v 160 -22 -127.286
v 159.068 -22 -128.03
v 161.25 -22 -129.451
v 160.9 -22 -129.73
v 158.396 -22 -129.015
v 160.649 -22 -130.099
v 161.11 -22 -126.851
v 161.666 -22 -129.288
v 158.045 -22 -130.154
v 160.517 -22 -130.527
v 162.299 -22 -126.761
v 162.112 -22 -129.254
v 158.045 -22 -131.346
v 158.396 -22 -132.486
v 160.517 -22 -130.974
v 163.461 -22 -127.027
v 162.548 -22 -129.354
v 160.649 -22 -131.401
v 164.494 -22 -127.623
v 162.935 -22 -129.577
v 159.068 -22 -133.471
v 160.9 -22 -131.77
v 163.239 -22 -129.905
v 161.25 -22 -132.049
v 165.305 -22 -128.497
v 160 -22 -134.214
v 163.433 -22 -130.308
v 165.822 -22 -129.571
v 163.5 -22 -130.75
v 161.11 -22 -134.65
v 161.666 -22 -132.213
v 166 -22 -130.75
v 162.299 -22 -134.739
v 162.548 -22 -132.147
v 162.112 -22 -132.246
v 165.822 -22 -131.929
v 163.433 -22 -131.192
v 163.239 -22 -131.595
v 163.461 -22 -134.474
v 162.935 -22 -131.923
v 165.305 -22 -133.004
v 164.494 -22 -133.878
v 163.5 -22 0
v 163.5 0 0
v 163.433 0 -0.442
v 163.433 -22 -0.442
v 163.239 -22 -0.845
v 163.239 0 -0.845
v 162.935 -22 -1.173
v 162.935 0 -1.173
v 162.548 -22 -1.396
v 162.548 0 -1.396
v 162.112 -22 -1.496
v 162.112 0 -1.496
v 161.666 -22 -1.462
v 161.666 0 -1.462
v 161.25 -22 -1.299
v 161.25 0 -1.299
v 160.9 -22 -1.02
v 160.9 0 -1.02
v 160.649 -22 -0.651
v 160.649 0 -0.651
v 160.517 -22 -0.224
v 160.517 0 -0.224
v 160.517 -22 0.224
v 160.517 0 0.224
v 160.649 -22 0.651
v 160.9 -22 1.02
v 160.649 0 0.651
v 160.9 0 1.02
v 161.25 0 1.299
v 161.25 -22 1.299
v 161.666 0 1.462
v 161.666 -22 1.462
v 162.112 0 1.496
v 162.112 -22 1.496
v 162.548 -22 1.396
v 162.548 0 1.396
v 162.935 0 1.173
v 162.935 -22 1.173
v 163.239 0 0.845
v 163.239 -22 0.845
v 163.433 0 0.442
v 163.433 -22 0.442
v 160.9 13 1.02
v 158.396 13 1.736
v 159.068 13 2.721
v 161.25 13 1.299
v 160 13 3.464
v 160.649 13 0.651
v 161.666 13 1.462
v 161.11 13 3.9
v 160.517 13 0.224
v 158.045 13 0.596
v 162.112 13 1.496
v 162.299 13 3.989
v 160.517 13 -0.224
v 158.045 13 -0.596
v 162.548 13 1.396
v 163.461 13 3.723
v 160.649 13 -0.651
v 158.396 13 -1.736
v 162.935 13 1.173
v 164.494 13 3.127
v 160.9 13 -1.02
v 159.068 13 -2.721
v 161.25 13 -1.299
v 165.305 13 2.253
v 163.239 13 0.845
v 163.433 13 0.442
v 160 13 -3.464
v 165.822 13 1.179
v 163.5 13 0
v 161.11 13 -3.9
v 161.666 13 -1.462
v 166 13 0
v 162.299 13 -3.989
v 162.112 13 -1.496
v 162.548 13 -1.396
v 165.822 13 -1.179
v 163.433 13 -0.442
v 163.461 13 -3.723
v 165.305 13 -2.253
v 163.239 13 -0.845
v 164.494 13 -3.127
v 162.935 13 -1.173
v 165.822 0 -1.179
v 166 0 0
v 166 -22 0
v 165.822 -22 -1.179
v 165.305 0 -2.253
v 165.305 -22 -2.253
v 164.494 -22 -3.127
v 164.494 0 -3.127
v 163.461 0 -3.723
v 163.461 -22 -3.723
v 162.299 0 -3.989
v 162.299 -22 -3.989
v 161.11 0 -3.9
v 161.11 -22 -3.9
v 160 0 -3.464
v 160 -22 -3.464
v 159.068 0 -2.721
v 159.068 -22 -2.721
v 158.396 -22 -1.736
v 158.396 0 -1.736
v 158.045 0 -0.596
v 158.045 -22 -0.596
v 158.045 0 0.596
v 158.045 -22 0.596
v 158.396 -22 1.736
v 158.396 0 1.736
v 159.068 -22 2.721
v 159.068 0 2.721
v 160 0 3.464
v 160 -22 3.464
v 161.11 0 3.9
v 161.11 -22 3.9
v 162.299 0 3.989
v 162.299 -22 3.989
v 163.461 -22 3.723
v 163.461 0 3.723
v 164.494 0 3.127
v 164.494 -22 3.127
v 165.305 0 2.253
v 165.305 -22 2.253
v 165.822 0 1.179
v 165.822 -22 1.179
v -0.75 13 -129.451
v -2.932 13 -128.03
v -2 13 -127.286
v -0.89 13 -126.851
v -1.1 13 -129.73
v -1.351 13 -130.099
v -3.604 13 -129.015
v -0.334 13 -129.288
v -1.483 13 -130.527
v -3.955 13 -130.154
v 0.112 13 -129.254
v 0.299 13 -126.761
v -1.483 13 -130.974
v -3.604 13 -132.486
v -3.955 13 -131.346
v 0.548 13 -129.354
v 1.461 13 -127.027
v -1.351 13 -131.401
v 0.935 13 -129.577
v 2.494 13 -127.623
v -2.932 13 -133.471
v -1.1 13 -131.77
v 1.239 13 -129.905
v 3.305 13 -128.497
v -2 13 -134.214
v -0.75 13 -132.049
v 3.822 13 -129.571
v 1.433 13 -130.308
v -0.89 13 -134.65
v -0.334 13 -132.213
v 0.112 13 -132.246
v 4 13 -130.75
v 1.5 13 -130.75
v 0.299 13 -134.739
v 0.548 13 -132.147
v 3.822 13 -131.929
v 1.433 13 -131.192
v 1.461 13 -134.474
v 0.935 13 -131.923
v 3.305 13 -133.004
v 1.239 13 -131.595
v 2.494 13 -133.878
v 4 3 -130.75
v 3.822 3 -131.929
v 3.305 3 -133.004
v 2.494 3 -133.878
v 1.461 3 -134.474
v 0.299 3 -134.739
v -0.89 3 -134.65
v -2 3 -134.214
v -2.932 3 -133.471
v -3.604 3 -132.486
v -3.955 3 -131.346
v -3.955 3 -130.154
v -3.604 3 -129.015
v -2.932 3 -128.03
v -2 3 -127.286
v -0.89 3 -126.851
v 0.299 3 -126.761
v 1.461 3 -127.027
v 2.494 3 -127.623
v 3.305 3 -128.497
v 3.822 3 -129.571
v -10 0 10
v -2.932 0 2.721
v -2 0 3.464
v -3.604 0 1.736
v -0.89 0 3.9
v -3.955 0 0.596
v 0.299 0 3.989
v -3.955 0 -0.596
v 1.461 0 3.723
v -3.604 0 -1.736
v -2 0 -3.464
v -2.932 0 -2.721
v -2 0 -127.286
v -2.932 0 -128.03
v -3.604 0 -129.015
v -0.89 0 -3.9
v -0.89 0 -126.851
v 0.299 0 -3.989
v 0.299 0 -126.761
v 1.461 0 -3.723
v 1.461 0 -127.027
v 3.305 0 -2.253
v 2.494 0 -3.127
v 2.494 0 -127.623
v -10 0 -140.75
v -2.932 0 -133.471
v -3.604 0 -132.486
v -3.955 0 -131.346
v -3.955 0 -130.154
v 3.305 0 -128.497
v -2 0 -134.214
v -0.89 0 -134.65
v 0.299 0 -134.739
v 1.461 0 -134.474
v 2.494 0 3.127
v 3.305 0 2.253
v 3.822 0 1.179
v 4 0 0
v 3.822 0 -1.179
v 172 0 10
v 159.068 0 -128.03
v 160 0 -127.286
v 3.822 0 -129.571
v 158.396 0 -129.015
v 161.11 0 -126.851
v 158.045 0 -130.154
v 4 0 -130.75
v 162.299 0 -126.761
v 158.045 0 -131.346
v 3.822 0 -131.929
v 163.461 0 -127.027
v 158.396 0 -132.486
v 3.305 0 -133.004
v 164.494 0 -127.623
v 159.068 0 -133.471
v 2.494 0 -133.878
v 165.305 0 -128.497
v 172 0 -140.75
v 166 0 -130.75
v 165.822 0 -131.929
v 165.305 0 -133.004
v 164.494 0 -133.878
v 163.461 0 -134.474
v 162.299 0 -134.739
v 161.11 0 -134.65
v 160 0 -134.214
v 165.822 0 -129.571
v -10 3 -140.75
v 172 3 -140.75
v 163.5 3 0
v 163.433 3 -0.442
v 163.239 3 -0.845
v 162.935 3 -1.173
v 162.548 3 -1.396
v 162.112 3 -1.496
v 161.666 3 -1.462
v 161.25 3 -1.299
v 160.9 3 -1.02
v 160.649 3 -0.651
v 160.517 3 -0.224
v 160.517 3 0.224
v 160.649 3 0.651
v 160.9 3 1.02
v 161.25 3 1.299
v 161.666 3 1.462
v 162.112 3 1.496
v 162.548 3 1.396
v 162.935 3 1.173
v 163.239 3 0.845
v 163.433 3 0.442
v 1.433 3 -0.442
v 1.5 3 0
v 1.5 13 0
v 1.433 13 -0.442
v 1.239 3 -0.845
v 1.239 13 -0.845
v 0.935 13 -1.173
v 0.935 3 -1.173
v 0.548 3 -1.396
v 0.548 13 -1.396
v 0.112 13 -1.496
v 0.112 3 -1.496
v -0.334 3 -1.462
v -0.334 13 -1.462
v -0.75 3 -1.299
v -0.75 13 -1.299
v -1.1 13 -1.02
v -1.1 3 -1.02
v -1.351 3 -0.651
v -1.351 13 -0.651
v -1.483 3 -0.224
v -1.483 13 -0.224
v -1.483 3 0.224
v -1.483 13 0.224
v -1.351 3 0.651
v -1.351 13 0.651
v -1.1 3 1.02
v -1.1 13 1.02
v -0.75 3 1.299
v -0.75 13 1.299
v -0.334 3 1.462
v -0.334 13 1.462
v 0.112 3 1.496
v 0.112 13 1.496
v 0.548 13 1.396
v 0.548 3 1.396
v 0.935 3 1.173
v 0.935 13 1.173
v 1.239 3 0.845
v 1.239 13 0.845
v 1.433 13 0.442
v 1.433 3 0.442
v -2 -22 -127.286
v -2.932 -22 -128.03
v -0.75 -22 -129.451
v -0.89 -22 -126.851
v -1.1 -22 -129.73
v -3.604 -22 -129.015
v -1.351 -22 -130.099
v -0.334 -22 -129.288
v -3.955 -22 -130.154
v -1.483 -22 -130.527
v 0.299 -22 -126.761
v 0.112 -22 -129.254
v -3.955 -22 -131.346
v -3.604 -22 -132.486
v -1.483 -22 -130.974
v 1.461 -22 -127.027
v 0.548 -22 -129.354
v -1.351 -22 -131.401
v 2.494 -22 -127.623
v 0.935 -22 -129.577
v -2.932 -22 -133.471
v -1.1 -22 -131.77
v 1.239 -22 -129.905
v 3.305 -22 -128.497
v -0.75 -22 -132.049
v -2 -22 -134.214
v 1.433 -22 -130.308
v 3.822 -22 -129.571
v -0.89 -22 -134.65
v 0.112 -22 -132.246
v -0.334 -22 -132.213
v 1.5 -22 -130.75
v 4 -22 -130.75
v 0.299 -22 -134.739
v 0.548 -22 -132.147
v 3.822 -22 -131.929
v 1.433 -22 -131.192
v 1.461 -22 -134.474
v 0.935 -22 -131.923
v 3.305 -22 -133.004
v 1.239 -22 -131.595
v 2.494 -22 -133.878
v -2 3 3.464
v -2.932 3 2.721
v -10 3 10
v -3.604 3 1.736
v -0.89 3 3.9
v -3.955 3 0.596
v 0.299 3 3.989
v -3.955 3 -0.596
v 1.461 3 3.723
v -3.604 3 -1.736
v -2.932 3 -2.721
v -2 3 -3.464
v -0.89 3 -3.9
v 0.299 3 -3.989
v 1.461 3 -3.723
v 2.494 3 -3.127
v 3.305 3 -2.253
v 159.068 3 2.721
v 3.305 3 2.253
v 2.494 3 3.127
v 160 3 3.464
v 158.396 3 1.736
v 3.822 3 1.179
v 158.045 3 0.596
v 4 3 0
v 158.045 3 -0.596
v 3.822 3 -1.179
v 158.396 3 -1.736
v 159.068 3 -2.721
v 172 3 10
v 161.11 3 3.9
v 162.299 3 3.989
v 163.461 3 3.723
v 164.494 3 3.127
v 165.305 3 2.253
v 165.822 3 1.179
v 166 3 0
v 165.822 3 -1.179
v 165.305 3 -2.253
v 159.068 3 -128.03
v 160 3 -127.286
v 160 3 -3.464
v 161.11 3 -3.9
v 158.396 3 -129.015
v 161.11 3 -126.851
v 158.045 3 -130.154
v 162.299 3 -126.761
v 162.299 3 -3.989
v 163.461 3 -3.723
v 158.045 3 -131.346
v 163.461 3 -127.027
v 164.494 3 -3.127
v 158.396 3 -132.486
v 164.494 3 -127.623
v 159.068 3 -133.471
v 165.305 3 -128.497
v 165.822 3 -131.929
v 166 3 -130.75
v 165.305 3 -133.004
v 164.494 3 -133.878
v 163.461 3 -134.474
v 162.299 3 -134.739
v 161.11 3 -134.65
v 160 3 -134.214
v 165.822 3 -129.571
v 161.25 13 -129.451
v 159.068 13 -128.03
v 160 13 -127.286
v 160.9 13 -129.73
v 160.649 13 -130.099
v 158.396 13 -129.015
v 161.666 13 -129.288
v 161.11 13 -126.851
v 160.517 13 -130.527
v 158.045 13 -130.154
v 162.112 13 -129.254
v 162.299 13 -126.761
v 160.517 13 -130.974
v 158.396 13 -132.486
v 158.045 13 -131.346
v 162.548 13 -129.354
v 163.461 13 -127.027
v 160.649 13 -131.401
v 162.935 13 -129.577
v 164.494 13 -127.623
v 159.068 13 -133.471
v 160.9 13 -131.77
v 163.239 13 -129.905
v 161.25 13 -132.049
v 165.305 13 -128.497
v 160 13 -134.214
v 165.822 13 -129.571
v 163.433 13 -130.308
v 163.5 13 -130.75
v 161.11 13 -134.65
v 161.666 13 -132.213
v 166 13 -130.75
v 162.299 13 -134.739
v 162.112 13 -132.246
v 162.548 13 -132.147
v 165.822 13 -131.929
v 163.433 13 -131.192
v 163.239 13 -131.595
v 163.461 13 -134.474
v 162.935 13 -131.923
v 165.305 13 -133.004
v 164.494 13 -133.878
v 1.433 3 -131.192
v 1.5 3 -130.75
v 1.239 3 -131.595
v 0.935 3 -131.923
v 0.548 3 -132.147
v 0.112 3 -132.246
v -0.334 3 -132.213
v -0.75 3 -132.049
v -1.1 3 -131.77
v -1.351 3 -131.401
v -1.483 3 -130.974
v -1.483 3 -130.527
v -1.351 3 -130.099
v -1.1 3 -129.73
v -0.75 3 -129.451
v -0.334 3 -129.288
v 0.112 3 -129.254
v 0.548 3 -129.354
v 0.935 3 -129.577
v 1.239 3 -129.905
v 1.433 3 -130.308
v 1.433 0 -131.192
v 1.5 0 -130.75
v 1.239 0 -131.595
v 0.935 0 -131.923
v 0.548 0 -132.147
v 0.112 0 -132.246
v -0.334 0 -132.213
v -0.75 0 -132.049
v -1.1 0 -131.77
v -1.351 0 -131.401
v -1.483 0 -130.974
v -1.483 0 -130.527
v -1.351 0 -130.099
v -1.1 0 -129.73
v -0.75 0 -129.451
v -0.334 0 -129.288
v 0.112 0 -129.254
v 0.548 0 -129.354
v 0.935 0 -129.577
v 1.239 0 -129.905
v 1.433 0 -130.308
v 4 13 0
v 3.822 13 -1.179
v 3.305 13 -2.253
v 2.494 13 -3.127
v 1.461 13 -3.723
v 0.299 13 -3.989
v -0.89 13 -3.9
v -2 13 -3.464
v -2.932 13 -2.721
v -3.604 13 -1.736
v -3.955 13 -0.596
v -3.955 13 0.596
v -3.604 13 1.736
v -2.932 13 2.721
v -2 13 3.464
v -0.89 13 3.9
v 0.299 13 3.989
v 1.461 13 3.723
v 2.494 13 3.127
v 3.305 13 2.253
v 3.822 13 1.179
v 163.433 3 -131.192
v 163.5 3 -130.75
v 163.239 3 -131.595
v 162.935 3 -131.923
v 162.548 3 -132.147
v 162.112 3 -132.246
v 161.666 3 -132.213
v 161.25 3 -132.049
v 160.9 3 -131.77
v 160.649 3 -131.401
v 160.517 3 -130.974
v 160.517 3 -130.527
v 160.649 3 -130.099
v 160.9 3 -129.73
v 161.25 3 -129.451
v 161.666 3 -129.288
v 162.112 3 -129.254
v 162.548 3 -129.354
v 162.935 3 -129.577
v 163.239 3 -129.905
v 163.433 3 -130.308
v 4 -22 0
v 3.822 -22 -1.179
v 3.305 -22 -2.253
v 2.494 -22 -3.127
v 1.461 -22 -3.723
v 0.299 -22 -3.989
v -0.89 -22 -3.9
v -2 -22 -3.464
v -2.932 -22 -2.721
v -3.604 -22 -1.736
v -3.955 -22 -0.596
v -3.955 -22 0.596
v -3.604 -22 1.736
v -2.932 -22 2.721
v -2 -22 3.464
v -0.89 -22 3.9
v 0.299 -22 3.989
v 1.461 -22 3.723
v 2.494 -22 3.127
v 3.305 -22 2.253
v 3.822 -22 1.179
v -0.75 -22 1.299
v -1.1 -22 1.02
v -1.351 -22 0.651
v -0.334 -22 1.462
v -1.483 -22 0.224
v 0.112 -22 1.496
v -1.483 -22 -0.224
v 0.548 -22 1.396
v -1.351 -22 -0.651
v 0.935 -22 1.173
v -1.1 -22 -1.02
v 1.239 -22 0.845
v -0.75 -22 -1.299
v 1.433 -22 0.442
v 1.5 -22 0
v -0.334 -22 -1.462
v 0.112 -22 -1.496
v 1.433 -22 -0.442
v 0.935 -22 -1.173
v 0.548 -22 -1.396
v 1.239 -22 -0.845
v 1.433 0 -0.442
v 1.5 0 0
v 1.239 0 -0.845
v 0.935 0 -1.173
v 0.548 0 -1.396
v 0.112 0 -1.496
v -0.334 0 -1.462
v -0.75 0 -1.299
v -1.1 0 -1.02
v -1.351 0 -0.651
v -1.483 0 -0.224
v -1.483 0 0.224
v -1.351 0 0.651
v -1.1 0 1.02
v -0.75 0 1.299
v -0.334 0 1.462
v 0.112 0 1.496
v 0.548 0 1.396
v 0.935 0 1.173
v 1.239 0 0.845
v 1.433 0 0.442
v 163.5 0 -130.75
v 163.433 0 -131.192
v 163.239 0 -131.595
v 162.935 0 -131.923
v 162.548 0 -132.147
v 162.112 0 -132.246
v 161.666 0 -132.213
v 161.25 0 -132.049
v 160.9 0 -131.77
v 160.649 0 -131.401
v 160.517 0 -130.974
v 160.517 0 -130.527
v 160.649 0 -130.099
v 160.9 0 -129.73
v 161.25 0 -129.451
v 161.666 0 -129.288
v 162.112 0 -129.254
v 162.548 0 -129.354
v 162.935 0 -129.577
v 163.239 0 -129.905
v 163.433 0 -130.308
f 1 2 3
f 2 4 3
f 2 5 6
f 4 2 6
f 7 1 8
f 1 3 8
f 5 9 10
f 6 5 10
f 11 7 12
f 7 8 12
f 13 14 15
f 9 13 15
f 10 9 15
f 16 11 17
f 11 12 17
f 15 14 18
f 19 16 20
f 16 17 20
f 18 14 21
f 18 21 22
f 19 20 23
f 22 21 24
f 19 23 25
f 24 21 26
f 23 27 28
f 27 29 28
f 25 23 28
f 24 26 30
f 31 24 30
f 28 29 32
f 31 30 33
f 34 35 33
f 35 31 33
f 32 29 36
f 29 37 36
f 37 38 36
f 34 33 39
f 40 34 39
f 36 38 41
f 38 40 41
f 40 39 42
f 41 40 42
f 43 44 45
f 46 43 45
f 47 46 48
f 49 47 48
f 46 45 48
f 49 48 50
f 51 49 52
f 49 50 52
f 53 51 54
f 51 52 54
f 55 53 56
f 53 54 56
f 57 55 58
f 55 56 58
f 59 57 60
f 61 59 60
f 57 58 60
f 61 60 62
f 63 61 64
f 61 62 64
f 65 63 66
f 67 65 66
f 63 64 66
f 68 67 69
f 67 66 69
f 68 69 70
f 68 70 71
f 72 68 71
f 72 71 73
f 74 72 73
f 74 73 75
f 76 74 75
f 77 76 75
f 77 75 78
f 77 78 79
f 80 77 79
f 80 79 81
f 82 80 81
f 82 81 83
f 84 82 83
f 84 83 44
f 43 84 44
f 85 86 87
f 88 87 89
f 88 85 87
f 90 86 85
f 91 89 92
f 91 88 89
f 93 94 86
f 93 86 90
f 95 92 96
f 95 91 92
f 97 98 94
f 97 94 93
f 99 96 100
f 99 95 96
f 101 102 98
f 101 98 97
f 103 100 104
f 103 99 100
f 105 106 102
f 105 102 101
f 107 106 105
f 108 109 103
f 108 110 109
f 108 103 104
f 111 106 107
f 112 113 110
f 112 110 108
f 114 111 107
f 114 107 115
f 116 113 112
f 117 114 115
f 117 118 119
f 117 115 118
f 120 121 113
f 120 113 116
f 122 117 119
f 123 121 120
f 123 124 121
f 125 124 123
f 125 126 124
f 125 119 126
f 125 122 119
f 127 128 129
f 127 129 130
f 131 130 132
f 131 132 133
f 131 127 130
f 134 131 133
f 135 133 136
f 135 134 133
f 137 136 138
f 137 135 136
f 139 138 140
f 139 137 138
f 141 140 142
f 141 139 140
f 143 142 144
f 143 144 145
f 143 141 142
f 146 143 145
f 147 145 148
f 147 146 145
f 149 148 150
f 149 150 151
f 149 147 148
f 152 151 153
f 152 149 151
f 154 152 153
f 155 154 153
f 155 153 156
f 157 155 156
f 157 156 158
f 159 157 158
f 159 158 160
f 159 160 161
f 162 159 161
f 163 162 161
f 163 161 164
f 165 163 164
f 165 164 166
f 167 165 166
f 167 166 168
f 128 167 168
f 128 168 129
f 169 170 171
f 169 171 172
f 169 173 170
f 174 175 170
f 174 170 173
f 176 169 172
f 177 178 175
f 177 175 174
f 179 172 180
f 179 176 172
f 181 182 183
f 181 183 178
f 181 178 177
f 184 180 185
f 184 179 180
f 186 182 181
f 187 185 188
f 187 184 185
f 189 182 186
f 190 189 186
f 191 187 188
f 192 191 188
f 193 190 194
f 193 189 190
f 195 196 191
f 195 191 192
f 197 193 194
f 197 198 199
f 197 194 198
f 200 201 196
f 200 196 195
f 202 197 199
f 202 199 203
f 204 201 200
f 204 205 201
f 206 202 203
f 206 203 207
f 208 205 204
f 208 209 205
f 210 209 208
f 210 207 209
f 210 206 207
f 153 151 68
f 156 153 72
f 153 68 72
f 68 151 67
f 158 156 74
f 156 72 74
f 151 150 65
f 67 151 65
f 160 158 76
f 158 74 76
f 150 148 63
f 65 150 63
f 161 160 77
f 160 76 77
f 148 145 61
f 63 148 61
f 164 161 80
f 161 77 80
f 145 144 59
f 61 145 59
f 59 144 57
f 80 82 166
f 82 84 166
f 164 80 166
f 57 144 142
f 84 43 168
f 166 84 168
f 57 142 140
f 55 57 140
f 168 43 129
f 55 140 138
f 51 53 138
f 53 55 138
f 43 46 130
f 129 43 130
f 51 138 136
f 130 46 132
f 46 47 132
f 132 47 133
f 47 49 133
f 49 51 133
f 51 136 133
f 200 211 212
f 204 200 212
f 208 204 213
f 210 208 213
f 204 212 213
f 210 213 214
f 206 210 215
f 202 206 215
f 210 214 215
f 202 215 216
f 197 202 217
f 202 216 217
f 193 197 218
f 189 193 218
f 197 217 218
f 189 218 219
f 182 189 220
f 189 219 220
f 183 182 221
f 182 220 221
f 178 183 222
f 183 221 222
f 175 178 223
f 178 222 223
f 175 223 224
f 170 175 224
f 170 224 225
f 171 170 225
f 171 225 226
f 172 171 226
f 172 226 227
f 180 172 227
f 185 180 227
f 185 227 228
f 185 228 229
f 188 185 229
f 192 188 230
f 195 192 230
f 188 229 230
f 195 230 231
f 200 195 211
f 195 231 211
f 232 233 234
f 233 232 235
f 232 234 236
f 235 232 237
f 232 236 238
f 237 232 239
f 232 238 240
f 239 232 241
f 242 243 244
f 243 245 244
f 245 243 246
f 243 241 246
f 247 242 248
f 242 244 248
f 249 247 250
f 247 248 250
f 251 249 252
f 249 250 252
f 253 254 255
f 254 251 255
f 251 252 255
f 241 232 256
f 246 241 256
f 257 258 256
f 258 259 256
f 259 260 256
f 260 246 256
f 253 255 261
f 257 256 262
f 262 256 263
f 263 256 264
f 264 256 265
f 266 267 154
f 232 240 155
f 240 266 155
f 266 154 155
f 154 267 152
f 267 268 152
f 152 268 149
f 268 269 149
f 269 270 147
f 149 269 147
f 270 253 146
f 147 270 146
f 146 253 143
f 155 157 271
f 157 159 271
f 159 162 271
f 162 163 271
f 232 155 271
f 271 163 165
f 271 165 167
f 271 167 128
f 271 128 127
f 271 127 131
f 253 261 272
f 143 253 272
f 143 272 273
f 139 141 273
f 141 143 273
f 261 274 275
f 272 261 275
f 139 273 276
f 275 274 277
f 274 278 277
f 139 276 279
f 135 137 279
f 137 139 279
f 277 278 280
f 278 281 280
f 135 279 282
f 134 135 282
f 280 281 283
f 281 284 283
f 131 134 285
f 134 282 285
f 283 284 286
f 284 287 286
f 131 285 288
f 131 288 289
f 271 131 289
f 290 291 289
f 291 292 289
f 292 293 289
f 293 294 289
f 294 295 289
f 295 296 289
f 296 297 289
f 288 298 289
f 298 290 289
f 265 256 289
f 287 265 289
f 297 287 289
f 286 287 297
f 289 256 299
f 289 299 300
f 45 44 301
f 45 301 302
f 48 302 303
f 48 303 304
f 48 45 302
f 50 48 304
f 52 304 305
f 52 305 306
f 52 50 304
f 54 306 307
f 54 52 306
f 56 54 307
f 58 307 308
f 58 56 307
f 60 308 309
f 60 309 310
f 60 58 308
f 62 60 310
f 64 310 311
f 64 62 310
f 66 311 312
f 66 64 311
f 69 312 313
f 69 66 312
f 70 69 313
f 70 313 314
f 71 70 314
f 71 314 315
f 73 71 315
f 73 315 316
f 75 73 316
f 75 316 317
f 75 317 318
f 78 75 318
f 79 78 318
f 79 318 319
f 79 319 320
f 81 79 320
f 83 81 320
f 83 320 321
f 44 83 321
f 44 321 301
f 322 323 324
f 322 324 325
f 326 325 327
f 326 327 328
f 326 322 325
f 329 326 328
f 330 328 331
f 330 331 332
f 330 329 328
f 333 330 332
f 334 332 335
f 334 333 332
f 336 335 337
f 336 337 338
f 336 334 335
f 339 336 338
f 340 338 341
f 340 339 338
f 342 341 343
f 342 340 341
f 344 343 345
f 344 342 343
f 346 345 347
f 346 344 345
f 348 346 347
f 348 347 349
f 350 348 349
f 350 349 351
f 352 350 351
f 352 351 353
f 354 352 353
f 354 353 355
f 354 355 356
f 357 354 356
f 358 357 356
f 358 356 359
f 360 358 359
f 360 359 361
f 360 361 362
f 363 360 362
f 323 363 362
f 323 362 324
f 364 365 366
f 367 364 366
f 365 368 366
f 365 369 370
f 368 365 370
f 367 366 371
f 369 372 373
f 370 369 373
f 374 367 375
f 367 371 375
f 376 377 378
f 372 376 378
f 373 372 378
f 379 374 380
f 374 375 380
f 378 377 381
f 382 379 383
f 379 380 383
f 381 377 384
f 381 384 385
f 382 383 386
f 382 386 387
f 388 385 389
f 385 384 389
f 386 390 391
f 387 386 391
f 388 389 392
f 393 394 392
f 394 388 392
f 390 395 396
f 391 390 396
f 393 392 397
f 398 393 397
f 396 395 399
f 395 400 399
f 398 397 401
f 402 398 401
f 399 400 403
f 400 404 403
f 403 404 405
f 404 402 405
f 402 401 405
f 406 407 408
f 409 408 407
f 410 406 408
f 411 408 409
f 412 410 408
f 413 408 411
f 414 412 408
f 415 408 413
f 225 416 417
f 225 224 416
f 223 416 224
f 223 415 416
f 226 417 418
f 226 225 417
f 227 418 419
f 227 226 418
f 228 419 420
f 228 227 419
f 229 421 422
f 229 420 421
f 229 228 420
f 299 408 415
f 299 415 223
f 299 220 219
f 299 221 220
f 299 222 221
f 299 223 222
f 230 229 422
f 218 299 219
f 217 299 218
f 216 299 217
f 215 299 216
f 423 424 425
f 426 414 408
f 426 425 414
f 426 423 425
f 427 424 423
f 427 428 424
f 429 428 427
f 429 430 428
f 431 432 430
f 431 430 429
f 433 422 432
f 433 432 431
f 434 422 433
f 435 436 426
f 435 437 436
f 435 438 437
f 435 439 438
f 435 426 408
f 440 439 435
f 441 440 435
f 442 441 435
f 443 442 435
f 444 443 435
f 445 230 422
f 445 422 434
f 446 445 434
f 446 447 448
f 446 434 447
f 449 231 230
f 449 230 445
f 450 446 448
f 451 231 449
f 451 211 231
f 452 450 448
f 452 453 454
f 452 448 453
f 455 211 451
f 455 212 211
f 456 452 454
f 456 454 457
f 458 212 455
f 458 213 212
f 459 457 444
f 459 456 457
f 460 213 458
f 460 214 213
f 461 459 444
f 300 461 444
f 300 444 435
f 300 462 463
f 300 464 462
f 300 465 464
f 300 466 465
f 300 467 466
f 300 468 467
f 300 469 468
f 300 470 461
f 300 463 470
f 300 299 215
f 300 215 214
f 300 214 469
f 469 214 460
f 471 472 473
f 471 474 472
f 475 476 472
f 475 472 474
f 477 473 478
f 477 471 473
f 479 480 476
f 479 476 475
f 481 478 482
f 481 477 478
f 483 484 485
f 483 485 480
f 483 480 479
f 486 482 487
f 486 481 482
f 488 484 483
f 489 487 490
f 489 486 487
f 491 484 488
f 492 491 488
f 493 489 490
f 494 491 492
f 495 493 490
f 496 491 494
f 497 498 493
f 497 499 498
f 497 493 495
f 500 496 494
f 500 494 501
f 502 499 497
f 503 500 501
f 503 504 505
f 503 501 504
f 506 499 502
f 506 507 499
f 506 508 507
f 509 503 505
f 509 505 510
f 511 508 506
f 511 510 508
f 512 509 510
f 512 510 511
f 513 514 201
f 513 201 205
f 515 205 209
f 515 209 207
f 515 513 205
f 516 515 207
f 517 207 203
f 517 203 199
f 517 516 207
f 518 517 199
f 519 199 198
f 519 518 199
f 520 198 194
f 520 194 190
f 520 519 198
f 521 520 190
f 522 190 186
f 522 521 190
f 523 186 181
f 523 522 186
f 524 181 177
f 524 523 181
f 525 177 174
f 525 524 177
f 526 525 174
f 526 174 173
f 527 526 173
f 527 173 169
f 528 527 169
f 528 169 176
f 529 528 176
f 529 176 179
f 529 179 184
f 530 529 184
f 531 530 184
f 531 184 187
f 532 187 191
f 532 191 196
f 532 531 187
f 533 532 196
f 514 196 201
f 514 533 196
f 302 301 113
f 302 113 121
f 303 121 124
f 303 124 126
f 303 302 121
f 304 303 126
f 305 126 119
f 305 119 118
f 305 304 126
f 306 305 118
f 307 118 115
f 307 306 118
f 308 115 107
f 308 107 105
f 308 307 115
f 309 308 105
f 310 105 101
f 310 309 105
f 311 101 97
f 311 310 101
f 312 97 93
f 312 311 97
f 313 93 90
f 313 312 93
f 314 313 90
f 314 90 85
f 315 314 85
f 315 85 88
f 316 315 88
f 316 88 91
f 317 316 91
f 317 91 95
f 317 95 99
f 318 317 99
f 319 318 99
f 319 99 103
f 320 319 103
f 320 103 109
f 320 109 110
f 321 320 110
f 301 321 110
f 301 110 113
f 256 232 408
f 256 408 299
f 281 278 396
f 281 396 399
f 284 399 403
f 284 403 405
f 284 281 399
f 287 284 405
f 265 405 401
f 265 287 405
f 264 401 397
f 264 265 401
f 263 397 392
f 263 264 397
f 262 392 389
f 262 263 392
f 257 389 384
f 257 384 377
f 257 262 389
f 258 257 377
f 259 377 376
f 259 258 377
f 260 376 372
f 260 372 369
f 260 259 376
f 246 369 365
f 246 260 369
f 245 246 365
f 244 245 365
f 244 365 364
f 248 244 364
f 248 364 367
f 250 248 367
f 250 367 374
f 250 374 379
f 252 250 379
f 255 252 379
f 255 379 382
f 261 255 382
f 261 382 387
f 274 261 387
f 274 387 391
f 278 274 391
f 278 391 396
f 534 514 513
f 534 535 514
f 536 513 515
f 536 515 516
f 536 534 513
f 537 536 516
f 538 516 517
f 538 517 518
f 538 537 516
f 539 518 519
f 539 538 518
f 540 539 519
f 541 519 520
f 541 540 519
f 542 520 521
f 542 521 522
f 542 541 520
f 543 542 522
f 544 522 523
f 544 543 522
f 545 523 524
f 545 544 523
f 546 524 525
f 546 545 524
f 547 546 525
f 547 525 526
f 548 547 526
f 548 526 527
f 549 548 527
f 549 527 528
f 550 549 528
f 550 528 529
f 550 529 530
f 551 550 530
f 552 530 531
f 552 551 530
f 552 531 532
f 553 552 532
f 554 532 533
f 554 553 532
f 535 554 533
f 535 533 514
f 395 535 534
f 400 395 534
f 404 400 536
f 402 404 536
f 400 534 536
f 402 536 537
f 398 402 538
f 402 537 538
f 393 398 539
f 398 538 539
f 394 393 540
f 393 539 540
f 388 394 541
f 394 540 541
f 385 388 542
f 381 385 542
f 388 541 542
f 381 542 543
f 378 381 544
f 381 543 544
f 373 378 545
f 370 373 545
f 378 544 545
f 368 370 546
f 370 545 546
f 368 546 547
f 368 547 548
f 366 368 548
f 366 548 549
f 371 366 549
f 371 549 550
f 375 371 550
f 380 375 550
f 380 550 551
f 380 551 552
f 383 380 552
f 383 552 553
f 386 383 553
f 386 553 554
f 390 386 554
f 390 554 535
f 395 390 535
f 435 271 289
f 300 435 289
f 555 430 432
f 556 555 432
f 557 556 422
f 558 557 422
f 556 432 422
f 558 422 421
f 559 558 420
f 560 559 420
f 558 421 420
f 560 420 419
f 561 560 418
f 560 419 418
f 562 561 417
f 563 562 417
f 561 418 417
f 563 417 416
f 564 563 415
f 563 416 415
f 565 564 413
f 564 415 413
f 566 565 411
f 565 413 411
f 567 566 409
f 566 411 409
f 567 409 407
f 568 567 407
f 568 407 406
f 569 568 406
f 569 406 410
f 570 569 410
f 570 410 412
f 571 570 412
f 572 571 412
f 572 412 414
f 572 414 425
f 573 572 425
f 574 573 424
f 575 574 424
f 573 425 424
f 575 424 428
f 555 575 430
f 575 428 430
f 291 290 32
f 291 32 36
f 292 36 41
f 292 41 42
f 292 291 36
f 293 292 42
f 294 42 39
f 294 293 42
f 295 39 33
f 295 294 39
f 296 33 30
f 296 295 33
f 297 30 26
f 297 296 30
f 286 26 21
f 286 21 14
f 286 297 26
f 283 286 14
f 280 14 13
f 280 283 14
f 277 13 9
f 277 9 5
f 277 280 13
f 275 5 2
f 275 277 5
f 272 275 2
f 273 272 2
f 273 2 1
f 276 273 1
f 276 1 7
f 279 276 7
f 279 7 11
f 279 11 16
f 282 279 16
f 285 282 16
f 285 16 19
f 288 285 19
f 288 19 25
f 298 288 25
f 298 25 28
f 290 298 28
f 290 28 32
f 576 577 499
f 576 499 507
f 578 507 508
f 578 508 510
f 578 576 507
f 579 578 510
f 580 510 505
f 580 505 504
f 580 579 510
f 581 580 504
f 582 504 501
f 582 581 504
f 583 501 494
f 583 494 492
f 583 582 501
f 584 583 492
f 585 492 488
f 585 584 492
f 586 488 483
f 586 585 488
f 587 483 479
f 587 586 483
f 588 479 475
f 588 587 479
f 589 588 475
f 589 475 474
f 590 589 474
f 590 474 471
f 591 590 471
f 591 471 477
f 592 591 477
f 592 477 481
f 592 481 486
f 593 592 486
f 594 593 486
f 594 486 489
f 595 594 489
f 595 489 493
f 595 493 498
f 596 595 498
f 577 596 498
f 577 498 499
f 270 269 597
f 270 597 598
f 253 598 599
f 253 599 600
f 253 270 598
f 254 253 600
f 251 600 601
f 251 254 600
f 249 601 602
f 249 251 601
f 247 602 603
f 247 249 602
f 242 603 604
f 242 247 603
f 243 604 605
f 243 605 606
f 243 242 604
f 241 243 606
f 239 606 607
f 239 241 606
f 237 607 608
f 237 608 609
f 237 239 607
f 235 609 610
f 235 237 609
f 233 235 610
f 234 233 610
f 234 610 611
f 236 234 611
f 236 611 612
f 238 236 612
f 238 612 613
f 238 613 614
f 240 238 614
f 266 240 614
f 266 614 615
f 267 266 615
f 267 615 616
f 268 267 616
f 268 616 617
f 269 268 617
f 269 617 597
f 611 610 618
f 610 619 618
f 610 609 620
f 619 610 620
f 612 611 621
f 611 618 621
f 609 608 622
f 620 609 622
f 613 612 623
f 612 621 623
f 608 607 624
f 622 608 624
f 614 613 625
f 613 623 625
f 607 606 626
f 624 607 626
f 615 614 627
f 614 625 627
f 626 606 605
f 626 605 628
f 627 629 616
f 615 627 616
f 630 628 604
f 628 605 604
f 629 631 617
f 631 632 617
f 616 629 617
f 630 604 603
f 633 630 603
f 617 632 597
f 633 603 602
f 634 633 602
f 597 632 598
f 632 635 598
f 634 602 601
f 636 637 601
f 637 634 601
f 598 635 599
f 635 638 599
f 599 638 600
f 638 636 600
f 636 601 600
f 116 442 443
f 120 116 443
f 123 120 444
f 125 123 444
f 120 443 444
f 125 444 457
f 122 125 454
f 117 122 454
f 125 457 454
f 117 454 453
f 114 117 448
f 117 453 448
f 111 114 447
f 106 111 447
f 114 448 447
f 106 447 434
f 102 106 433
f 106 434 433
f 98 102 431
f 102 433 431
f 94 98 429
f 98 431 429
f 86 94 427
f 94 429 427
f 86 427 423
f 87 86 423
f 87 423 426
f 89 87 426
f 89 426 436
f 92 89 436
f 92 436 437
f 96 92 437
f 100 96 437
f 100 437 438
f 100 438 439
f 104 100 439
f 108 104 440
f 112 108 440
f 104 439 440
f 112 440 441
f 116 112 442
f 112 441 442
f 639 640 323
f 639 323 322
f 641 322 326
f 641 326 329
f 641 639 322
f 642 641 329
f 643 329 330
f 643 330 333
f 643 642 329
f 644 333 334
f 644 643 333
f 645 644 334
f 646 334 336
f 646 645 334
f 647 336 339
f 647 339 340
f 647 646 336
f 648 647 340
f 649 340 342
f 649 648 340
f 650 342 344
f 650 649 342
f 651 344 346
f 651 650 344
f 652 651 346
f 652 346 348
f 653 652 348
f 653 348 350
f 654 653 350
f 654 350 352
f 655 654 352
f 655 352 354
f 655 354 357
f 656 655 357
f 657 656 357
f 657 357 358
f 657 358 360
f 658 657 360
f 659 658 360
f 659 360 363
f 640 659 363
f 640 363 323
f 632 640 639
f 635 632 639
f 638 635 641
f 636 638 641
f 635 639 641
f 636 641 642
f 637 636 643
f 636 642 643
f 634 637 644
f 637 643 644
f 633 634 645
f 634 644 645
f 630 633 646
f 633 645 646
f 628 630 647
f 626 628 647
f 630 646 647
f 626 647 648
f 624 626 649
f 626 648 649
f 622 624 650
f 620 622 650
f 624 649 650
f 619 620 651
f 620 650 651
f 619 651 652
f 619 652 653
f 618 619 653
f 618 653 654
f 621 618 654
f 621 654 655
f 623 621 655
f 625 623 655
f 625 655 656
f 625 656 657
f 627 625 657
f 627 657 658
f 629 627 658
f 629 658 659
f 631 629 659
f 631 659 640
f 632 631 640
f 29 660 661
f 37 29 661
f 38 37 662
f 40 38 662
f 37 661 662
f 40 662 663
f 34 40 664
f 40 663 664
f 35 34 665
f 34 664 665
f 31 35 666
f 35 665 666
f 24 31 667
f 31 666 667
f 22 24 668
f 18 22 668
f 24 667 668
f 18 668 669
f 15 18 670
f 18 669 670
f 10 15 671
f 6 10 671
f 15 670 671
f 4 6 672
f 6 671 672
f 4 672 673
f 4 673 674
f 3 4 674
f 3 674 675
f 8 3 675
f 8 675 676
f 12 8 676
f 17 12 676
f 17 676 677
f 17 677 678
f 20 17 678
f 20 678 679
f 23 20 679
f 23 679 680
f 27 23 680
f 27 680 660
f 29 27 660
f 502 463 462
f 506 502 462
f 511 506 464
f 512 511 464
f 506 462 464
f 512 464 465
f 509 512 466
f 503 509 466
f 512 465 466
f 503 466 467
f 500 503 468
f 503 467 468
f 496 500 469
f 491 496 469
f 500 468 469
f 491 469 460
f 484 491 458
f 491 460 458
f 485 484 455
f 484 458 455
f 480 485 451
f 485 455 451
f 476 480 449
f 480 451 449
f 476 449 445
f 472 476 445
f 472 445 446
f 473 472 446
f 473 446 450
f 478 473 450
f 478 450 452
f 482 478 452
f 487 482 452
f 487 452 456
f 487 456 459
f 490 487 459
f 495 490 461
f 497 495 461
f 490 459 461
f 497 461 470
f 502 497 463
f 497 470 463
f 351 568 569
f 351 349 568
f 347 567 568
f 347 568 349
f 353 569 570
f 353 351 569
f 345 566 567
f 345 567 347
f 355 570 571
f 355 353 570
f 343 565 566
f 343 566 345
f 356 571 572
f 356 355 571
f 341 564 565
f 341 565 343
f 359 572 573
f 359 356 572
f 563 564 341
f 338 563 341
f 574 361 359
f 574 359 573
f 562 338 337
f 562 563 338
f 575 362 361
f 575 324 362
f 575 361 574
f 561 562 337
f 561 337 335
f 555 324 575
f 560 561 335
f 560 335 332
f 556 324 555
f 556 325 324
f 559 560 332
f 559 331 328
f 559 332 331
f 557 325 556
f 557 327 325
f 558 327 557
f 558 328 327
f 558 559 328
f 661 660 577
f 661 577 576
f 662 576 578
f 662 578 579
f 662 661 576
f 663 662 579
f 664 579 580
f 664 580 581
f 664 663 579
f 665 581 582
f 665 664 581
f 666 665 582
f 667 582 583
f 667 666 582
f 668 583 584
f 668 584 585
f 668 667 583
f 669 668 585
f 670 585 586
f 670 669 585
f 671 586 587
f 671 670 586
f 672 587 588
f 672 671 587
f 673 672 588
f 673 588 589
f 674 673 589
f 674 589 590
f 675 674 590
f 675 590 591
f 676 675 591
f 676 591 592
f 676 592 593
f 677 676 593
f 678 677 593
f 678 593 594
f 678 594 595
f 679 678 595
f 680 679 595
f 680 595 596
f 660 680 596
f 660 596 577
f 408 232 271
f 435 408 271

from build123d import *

# Parameters (mm, degrees)
SKETCH1_W                = 182
SKETCH1_H                = 150.75023901
SKETCH1_R                = 1.5
BOSS_EXTRUDE1_DEPTH      = 3
SKETCH2_R                = 4
SKETCH2_R_2              = 1.5
BOSS_EXTRUDE2_DEPTH      = 10
BOSS_EXTRUDE2_DEPTH_BACK = 25


with BuildPart() as part:
    # Sketch1 → Boss-Extrude1 (new body)
    with BuildSketch(Plane(origin=(0, 0, 0), x_dir=(1, 0, 0), z_dir=(0, 1, 0))):
        with Locations((81, 65.375119505)):
            Rectangle(SKETCH1_W, SKETCH1_H)
        with Locations((0, 130.75023901)):
            Circle(SKETCH1_R, mode=Mode.SUBTRACT)
        with Locations((162, 130.75023901)):
            Circle(SKETCH1_R, mode=Mode.SUBTRACT)
        with Locations((162, 0)):
            Circle(SKETCH1_R, mode=Mode.SUBTRACT)
        Circle(SKETCH1_R, mode=Mode.SUBTRACT)
    extrude(amount=BOSS_EXTRUDE1_DEPTH)

    # Sketch2 → Boss-Extrude2 (add, two sides)
    with BuildSketch(Plane(origin=(0, 3, 0), x_dir=(1, 0, 0), z_dir=(0, 1, 0))) as boss_extrude2_sk:
        with Locations((0, 130.75023901)):
            Circle(SKETCH2_R)
        with Locations((0, 130.75023901)):
            Circle(SKETCH2_R_2, mode=Mode.SUBTRACT)
        with Locations((162, 130.75023901)):
            Circle(SKETCH2_R)
        with Locations((162, 130.75023901)):
            Circle(SKETCH2_R_2, mode=Mode.SUBTRACT)
        with Locations((162, 0)):
            Circle(SKETCH2_R)
        with Locations((162, 0)):
            Circle(SKETCH2_R_2, mode=Mode.SUBTRACT)
        Circle(SKETCH2_R)
        Circle(SKETCH2_R_2, mode=Mode.SUBTRACT)
    extrude(amount=BOSS_EXTRUDE2_DEPTH)
    extrude(boss_extrude2_sk.sketch, amount=-BOSS_EXTRUDE2_DEPTH_BACK)


solid = part.part
